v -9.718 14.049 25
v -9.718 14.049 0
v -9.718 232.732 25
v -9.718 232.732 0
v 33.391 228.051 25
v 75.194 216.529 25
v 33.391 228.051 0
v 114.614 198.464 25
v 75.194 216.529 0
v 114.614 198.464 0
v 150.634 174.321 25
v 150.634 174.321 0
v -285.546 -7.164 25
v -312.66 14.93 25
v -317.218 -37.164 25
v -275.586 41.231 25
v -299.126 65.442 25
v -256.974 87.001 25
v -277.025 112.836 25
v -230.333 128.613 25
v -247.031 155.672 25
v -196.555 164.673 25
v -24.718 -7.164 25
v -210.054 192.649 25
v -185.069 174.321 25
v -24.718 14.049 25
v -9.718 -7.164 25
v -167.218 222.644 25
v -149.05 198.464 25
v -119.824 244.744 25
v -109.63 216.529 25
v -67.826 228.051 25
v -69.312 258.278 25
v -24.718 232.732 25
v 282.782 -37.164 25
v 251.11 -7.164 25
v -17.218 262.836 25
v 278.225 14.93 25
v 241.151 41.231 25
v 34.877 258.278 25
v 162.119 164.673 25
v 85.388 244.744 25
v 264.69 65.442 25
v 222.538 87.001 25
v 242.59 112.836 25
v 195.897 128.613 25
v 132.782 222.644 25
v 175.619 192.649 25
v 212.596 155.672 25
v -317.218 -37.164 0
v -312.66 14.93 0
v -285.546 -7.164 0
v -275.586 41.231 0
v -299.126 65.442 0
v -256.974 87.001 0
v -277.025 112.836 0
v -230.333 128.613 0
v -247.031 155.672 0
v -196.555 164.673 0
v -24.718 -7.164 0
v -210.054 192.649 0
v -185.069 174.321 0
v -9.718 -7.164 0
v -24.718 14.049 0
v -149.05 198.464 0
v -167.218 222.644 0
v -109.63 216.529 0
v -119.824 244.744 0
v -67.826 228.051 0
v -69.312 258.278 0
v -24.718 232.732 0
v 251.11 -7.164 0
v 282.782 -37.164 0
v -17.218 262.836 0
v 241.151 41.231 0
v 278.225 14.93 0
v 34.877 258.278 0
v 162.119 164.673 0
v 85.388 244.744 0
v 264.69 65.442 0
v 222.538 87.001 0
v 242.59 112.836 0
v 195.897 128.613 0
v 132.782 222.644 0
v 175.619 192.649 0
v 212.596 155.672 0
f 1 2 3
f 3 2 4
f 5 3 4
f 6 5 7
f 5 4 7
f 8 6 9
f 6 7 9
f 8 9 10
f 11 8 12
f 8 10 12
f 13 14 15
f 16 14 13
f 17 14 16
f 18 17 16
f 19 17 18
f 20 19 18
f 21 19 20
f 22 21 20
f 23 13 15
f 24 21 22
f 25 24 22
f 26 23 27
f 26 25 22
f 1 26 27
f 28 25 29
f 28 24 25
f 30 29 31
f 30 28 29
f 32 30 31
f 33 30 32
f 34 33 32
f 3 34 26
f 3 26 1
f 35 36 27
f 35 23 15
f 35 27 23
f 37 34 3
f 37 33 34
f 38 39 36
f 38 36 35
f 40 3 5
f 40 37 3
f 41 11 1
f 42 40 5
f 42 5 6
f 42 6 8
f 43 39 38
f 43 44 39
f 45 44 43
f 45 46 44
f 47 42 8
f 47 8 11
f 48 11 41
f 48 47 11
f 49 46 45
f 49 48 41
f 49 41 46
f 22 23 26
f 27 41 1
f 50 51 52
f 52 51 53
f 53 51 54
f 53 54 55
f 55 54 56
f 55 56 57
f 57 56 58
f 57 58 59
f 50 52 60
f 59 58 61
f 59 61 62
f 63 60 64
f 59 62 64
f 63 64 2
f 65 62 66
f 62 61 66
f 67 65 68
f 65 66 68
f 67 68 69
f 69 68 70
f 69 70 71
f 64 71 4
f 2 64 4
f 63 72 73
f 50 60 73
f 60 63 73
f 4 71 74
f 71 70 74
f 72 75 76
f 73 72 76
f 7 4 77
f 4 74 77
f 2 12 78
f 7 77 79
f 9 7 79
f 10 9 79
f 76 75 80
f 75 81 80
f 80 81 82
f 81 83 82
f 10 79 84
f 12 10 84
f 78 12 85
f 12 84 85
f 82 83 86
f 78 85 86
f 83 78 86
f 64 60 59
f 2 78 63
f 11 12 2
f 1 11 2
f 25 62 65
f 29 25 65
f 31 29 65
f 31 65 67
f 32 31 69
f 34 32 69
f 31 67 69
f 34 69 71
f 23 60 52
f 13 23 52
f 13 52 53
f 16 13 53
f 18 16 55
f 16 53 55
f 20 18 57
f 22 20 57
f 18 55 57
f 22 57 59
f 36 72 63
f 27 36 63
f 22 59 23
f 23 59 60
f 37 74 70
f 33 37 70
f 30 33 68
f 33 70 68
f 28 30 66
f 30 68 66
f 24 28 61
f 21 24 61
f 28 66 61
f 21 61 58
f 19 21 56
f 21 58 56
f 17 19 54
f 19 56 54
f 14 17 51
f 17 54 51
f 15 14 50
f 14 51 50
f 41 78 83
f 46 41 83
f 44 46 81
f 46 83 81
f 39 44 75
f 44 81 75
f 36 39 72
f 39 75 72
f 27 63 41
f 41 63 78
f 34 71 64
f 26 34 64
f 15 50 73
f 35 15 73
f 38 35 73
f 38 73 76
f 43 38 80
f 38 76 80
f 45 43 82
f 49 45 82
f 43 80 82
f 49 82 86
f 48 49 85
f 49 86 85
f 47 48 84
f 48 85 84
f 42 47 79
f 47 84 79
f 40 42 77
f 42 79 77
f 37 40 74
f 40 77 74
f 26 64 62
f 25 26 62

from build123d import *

# Parameters (mm, degrees)
F1_DEPTH = 25


with BuildPart() as f1:
    # F0 (on Top) → F1 (new body)
    with BuildSketch(Plane.XY):
        with BuildLine():
            ThreePointArc((-17.217742, 262.83602), (-229.349777, 174.968054), (-317.217742, -37.16398))
            Line((-317.217742, -37.16398), (-287.217742, -37.16398))
            ThreePointArc((-287.217742, -37.16398), (-286.799458, -22.140706), (-285.5459, -7.16398))
            ThreePointArc((-285.5459, -7.16398), (-256.973949, 87.001077), (-196.554829, 164.673106))
            ThreePointArc((-196.554829, 164.673106), (-190.879041, 169.576808), (-185.069229, 174.320956))
            ThreePointArc((-185.069229, 174.320956), (-109.629828, 216.52876), (-24.717742, 232.731833))
            ThreePointArc((-24.717742, 232.731833), (-17.217742, 232.83602), (-9.717742, 232.731833))
            ThreePointArc((-9.717742, 232.731833), (75.194344, 216.52876), (150.633745, 174.320956))
            ThreePointArc((150.633745, 174.320956), (156.443556, 169.576808), (162.119344, 164.673106))
            ThreePointArc((162.119344, 164.673106), (222.538464, 87.001077), (251.110415, -7.16398))
            ThreePointArc((251.110415, -7.16398), (252.363973, -22.140706), (252.782258, -37.16398))
            Line((252.782258, -37.16398), (282.782258, -37.16398))
            ThreePointArc((282.782258, -37.16398), (194.914292, 174.968054), (-17.217742, 262.83602))
        make_face()
        with BuildLine():
            ThreePointArc((-285.5459, -7.16398), (-286.799458, -22.140706), (-287.217742, -37.16398))
            Line((-287.217742, -37.16398), (252.782258, -37.16398))
            ThreePointArc((252.782258, -37.16398), (252.363973, -22.140706), (251.110415, -7.16398))
            Line((251.110415, -7.16398), (-9.717742, -7.16398))
            Line((-9.717742, -7.16398), (162.119344, 164.673106))
            ThreePointArc((162.119344, 164.673106), (156.443556, 169.576808), (150.633745, 174.320956))
            Line((150.633745, 174.320956), (-9.717742, 14.049223))
            Line((-9.717742, 14.049223), (-9.717742, 232.731833))
            ThreePointArc((-9.717742, 232.731833), (-17.217742, 232.83602), (-24.717742, 232.731833))
            Line((-24.717742, 232.731833), (-24.717742, 14.049223))
            Line((-24.717742, 14.049223), (-185.069229, 174.320956))
            ThreePointArc((-185.069229, 174.320956), (-190.879041, 169.576808), (-196.554829, 164.673106))
            Line((-196.554829, 164.673106), (-24.717742, -7.16398))
            Line((-24.717742, -7.16398), (-285.5459, -7.16398))
        make_face()
    extrude(amount=F1_DEPTH)


solid = f1.part
